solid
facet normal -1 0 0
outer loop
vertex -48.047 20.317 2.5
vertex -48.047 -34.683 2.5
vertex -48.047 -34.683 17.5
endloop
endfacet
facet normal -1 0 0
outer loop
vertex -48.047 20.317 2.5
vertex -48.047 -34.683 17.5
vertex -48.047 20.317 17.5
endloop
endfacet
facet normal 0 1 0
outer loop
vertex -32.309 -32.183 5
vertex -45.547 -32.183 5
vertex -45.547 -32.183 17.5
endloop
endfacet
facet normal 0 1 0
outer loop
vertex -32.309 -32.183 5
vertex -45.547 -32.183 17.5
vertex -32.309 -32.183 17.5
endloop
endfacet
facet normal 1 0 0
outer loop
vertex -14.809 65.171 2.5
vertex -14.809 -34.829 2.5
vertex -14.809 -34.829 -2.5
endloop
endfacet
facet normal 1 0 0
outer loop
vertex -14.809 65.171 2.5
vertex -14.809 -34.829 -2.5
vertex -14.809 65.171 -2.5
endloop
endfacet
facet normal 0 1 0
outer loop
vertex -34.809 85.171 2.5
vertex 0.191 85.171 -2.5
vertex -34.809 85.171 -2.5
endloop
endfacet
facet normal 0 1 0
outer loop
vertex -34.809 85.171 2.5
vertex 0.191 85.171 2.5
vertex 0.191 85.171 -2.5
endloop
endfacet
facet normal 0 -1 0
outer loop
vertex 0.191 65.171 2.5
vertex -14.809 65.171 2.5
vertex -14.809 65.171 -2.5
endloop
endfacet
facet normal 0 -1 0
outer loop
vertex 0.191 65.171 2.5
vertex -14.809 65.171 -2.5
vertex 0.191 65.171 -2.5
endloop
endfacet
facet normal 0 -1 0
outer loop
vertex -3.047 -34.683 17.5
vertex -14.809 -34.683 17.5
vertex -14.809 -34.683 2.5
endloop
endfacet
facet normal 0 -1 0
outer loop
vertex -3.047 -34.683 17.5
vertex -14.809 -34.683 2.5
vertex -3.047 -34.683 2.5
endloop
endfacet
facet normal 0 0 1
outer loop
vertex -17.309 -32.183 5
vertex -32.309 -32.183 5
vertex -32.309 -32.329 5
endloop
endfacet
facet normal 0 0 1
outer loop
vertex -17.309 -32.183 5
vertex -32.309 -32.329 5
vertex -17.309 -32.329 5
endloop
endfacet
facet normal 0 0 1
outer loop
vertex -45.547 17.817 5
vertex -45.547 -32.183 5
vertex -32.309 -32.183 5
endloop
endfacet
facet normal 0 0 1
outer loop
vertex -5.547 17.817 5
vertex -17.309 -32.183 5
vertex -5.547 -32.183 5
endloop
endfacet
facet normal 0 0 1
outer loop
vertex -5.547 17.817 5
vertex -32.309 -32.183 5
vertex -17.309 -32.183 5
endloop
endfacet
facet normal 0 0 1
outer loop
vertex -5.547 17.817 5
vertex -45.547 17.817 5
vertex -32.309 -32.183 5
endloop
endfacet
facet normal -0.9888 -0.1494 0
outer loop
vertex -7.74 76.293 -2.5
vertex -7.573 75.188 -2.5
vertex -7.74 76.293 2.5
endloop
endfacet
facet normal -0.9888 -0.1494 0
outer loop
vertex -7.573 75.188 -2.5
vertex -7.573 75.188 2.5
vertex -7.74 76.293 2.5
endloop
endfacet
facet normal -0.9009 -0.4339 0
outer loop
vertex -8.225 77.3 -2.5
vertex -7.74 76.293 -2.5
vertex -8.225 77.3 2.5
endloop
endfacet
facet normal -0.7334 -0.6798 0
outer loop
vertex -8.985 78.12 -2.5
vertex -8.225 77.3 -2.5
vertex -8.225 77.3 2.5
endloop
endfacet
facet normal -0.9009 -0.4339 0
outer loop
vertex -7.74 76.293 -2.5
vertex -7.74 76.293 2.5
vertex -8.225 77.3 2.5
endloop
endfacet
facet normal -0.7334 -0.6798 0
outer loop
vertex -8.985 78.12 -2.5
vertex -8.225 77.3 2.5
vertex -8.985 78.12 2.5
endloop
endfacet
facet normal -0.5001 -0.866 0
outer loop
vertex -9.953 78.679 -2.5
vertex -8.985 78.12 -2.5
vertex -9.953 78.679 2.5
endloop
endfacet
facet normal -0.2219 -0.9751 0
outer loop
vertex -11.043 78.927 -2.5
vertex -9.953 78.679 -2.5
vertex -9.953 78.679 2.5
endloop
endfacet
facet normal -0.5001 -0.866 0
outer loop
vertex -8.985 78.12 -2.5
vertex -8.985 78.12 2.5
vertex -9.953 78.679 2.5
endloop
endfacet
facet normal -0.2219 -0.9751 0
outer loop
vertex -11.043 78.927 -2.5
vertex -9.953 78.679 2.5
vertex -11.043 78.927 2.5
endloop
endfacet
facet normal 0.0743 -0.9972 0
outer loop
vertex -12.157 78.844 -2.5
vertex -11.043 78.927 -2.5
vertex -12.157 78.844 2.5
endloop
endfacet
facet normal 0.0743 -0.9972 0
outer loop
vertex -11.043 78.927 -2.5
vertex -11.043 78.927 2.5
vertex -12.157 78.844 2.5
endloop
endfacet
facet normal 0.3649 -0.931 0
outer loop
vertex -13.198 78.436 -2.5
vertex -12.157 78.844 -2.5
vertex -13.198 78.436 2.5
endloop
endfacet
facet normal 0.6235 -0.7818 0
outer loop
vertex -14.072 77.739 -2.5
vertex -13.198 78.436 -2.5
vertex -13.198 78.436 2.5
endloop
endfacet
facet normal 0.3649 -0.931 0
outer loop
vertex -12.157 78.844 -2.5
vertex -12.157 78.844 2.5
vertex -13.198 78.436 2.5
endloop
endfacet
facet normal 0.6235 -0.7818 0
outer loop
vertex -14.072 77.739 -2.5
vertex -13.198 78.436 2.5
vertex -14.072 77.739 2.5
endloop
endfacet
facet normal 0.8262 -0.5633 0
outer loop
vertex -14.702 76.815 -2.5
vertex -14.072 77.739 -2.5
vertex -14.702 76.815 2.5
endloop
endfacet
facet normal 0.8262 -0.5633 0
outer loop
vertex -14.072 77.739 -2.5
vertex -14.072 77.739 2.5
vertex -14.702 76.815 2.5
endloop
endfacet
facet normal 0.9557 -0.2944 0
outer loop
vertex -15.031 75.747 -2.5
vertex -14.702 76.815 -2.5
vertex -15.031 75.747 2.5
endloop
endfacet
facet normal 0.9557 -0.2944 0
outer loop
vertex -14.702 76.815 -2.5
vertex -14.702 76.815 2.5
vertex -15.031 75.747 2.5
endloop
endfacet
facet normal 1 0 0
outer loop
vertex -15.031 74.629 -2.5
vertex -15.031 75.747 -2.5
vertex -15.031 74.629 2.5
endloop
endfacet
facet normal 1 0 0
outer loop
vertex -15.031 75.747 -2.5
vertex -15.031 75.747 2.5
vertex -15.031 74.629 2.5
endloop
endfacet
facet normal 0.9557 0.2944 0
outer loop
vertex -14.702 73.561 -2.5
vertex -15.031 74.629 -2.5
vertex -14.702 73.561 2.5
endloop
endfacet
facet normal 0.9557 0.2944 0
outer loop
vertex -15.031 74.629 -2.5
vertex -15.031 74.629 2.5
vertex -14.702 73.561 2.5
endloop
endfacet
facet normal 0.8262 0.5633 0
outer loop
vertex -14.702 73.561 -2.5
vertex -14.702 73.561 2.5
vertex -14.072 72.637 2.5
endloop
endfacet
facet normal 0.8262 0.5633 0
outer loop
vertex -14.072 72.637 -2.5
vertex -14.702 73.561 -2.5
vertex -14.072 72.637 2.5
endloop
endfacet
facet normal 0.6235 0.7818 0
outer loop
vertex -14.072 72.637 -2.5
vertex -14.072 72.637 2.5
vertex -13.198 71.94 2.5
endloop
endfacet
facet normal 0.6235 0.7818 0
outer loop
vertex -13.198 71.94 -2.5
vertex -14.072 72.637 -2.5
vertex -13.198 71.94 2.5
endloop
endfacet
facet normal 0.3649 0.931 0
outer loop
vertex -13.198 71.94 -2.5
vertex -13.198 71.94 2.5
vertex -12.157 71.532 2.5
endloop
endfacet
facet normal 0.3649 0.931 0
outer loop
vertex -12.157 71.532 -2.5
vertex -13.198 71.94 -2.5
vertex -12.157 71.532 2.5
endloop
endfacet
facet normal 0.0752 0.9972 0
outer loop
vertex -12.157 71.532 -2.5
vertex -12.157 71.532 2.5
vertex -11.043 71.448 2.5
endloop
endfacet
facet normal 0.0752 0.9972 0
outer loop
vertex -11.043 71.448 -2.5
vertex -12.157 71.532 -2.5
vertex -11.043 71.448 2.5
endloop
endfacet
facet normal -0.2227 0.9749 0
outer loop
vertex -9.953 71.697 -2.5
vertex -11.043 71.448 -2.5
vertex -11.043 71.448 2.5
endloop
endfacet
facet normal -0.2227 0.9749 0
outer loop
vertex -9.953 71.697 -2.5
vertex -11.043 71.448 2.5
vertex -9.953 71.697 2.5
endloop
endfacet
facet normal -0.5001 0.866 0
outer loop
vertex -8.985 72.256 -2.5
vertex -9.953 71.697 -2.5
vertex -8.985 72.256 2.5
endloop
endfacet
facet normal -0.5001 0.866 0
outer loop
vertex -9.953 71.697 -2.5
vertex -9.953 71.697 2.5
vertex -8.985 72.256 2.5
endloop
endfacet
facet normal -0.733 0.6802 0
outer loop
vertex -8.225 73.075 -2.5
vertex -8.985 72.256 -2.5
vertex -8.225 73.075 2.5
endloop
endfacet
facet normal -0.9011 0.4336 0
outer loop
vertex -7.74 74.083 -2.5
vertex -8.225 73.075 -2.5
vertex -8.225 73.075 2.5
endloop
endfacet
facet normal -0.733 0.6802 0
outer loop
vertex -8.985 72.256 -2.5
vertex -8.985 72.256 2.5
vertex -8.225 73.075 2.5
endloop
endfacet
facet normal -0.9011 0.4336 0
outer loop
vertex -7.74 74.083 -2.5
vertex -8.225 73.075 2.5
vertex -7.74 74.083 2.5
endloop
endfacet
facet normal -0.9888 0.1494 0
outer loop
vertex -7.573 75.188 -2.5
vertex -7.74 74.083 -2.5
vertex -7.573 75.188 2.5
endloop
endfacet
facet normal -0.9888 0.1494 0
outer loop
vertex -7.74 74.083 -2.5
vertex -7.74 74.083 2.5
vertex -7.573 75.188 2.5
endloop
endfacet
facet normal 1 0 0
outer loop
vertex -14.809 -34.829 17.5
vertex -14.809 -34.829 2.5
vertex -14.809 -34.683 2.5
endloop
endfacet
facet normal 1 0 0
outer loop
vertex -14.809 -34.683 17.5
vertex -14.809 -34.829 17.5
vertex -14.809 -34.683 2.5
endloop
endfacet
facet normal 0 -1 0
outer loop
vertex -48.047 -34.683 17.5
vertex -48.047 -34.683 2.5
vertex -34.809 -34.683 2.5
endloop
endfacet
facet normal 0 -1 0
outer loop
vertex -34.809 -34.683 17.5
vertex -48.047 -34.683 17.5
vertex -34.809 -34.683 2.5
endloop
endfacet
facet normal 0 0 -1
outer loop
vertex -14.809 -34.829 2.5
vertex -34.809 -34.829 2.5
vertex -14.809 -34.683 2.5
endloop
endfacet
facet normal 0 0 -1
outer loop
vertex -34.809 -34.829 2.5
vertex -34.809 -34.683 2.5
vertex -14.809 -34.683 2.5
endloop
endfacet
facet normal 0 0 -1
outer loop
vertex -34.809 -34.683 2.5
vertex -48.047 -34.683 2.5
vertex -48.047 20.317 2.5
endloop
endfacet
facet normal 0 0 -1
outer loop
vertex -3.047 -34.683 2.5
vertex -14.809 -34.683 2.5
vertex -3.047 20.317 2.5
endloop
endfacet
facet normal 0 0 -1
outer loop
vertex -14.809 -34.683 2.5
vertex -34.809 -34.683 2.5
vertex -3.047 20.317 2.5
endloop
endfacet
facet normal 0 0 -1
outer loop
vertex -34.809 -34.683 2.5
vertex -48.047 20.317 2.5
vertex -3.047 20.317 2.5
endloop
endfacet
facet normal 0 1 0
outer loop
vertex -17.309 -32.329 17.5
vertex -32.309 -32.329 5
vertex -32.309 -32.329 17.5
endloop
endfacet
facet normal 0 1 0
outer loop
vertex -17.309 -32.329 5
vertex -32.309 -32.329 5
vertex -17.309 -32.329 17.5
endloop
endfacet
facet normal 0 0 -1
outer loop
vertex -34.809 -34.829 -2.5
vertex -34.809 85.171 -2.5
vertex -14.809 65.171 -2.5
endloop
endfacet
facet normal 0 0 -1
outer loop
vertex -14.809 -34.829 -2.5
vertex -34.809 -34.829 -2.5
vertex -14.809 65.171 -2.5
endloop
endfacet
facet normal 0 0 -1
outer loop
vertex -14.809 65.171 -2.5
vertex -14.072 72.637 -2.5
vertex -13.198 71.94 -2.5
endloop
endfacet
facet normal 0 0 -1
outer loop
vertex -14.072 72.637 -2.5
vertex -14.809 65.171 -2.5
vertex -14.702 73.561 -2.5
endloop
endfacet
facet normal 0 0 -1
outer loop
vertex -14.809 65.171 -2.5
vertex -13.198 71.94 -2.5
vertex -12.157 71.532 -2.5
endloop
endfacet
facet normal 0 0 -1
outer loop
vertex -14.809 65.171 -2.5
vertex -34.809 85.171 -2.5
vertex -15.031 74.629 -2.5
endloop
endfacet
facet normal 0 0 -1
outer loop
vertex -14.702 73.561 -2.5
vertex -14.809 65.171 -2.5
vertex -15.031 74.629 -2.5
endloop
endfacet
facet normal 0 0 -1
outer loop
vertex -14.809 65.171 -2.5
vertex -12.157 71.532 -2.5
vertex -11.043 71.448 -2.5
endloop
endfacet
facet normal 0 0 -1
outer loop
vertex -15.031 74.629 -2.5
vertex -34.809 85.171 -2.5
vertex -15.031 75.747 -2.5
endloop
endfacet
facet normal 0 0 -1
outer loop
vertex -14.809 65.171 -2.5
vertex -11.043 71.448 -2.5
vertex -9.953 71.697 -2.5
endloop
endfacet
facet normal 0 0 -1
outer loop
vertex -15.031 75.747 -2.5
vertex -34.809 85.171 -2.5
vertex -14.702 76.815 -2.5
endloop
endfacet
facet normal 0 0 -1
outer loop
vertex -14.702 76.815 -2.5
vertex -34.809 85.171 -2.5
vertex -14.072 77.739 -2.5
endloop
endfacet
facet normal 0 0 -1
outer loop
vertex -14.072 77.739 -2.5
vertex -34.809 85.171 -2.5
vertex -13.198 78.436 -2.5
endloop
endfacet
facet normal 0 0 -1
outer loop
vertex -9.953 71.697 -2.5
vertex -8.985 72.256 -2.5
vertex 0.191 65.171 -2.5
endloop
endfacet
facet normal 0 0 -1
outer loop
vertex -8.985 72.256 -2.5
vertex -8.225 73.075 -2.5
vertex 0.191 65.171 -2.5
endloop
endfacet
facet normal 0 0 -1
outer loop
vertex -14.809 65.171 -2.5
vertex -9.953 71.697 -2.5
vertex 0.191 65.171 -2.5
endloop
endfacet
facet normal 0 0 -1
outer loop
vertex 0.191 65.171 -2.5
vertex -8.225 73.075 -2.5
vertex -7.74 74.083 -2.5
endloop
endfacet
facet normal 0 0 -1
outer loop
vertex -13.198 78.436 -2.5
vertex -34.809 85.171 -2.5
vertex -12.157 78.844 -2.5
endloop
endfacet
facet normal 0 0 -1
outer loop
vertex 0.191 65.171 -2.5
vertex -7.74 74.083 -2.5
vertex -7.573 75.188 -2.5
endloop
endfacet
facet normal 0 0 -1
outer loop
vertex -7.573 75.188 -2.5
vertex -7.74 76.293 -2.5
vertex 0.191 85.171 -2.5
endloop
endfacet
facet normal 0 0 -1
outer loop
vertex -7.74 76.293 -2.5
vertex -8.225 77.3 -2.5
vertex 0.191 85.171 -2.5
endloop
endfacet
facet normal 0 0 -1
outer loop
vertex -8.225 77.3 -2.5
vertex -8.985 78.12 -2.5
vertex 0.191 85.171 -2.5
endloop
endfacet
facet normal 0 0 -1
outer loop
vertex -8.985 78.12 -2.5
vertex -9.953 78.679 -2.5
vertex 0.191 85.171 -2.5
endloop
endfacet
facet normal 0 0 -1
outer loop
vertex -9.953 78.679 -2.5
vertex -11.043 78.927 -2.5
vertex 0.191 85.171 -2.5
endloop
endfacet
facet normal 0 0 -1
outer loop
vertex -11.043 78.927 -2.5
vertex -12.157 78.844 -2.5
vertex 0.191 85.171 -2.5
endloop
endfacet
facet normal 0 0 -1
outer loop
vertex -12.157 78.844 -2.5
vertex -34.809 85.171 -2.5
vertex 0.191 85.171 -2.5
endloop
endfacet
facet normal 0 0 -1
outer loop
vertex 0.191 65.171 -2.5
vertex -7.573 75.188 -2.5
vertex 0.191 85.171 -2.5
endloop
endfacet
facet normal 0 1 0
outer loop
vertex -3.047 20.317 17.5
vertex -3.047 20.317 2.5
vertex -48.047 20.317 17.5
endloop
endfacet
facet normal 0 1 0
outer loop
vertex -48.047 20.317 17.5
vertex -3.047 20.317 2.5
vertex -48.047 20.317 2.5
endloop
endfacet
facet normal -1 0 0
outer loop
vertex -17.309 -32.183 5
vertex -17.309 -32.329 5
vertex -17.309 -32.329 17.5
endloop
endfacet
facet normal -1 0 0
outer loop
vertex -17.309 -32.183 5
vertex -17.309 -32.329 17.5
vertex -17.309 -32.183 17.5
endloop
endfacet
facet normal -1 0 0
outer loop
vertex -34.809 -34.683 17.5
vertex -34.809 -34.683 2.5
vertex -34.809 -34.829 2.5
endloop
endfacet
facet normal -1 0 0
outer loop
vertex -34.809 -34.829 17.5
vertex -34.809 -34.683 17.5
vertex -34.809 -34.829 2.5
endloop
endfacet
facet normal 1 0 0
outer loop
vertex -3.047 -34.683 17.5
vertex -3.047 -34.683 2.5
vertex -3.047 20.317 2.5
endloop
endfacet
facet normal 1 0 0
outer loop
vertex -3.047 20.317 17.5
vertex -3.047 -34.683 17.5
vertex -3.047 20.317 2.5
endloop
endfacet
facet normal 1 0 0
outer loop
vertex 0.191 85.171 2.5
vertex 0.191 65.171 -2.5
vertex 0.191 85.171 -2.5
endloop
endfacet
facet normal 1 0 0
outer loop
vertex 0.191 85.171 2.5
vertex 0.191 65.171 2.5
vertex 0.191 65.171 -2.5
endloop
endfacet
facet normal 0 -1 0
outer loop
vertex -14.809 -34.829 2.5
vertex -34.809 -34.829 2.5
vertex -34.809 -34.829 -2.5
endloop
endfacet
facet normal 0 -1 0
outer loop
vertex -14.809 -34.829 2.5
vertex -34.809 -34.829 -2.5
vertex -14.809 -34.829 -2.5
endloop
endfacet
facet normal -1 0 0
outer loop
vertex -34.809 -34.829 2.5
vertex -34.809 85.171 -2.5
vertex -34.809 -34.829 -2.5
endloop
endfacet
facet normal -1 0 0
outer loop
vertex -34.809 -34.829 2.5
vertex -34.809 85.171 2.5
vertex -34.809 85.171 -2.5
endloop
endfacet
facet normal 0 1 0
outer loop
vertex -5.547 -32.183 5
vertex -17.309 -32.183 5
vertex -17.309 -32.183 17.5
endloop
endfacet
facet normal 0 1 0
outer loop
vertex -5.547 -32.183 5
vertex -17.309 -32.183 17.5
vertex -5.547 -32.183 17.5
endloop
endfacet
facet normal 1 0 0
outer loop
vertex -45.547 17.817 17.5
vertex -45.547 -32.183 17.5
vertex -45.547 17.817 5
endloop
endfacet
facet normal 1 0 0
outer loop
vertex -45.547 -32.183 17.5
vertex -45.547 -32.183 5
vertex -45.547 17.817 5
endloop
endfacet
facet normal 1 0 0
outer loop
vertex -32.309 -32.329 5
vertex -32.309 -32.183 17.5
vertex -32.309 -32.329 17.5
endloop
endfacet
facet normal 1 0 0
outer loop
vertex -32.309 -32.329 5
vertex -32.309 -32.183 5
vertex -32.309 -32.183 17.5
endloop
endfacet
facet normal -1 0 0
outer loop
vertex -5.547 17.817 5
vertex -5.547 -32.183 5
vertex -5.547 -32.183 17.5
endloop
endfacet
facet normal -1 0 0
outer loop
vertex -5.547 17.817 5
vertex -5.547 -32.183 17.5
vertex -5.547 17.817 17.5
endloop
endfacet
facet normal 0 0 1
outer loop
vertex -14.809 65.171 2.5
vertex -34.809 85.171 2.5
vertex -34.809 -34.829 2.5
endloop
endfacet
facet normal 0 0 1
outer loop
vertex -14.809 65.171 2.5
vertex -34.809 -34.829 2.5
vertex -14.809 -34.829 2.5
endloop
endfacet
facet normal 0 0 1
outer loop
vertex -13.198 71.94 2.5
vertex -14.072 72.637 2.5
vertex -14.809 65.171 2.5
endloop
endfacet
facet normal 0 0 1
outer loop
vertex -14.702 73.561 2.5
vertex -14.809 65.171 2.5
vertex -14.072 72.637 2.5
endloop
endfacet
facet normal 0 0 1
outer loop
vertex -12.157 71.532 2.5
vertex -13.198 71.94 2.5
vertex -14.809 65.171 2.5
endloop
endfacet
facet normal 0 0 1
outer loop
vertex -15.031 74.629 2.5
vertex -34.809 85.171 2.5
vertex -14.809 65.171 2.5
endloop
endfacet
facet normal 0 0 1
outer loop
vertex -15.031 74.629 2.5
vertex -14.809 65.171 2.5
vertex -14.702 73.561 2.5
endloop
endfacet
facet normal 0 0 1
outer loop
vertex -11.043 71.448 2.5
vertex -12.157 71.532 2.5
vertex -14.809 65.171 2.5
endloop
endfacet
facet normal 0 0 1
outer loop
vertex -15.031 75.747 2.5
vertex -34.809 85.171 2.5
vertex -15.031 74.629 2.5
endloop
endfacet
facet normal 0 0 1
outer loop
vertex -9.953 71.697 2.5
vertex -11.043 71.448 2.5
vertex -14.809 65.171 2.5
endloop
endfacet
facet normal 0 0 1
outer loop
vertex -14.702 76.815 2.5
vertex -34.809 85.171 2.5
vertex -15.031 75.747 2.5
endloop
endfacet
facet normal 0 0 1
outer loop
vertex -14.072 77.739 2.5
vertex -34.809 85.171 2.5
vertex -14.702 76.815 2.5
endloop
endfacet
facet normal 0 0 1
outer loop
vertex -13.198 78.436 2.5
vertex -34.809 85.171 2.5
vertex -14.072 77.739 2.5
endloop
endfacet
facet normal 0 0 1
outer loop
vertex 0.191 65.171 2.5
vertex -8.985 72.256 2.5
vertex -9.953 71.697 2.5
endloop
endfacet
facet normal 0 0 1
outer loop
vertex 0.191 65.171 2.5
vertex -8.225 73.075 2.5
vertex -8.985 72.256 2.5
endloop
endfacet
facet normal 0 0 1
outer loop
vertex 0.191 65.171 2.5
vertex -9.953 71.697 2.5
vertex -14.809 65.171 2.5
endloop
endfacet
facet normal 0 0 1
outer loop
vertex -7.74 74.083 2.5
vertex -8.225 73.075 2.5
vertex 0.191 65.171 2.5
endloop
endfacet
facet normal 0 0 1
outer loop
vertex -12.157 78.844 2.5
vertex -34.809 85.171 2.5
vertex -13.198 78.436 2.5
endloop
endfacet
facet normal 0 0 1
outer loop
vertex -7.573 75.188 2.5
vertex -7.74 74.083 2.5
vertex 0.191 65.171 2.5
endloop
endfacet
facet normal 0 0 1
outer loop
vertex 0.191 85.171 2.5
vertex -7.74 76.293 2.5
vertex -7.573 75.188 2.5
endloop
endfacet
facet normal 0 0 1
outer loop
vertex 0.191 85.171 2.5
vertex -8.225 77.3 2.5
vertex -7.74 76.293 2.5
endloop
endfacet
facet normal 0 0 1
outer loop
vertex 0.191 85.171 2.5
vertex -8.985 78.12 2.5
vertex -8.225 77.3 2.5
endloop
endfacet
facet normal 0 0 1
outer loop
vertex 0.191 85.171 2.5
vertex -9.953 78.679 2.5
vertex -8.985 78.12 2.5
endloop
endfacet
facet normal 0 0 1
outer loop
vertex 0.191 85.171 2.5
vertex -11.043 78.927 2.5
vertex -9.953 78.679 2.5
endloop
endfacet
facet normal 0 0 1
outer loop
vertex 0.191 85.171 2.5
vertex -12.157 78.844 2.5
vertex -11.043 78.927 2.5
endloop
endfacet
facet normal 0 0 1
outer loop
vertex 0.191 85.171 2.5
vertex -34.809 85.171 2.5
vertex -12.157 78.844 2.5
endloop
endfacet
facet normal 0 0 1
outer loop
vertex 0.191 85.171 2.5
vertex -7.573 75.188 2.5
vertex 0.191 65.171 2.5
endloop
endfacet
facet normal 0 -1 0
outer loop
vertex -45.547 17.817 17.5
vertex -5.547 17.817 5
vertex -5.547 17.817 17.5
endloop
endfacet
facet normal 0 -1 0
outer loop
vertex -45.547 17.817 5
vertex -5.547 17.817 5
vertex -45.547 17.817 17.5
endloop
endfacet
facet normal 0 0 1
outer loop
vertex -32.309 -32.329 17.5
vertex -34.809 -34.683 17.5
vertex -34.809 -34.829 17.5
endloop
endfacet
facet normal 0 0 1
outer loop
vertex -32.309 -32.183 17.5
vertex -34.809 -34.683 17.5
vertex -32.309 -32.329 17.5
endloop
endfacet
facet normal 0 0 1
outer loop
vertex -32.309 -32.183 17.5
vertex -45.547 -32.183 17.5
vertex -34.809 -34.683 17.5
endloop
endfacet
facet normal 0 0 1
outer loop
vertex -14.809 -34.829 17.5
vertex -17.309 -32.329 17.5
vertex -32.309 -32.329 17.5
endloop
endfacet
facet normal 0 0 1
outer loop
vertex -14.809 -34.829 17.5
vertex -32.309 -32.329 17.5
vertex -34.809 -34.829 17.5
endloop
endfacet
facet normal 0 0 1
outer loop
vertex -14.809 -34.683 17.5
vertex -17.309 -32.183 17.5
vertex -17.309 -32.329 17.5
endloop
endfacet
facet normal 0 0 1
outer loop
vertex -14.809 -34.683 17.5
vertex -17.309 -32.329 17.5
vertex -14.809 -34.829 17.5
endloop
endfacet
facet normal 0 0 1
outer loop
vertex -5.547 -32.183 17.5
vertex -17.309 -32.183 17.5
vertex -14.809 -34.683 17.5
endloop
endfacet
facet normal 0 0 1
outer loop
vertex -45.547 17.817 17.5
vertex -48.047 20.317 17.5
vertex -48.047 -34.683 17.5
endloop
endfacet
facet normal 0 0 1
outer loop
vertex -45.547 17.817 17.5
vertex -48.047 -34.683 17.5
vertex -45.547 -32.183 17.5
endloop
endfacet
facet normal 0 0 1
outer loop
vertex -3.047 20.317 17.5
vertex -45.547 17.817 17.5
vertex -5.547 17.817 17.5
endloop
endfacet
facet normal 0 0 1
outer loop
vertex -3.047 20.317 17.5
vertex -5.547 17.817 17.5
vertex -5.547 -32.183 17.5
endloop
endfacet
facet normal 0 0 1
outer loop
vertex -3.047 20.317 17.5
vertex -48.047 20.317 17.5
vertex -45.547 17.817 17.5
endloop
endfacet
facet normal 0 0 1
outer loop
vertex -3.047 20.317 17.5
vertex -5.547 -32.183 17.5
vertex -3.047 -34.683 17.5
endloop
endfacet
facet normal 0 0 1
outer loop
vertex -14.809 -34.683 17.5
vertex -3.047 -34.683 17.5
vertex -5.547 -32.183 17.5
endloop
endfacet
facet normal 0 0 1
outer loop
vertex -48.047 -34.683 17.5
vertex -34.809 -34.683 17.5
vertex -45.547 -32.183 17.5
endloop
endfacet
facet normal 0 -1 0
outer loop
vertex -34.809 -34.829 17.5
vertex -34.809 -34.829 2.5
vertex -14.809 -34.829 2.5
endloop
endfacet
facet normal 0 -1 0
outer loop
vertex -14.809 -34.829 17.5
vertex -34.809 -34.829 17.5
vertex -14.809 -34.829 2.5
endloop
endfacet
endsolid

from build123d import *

# Parameters (mm, degrees)
F1_DEPTH = 2.5
F2_W     = 20
F2_H     = 0.1460519966
F2_W_2   = 11.762814112
F2_H_2   = 55
F2_W_3   = 13.237185888
F3_DEPTH = 15
F4_T     = -2.5
F5_R     = 3.75
F6_DEPTH = 5


with BuildPart() as f1:
    # F0 (on Top) → F1 (new body, symmetric)
    with BuildSketch(Plane.XY):
        Polygon((-34.8094058409, 85.1708357993), (-34.8094058409, -1.6712700429), (-34.8094058409, -34.8291642007), (-14.8094058409, -34.8291642007), (-14.8094058409, 65.1708357993), (0.1905941591, 65.1708357993), (0.1905941591, 85.1708357993), align=None)
    extrude(amount=F1_DEPTH, both=True)

    # F5 (on Top) → F6 (cut, symmetric)
    with BuildSketch(Plane.XY):
        with Locations((-11.3229686394, 75.1879066229)):
            Circle(F5_R)
    extrude(amount=F6_DEPTH, both=True, mode=Mode.SUBTRACT)


with BuildPart() as f3:
    # F2 (on face) → F3 (new body)
    with BuildSketch(Plane.XY.offset(2.5)):
        with Locations((-24.8094058409, -34.7561382024)):
            Rectangle(F2_W, F2_H)
        with Locations((-8.9279987849, -7.1831122041)):
            Rectangle(F2_W_2, F2_H_2)
        with Locations((-24.8094058409, -7.1831122041)):
            Rectangle(F2_W, F2_H_2)
        with Locations((-41.4279987849, -7.1831122041)):
            Rectangle(F2_W_3, F2_H_2)
    extrude(amount=F3_DEPTH)

    # F4
    f4_openings = [f3.faces().sort_by_distance(p)[0] for p in [
        (-25.545723, -7.215616, 17.5),
    ]]
    offset(amount=F4_T, openings=f4_openings, kind=Kind.INTERSECTION)


solid = Compound([f1.part, f3.part])
